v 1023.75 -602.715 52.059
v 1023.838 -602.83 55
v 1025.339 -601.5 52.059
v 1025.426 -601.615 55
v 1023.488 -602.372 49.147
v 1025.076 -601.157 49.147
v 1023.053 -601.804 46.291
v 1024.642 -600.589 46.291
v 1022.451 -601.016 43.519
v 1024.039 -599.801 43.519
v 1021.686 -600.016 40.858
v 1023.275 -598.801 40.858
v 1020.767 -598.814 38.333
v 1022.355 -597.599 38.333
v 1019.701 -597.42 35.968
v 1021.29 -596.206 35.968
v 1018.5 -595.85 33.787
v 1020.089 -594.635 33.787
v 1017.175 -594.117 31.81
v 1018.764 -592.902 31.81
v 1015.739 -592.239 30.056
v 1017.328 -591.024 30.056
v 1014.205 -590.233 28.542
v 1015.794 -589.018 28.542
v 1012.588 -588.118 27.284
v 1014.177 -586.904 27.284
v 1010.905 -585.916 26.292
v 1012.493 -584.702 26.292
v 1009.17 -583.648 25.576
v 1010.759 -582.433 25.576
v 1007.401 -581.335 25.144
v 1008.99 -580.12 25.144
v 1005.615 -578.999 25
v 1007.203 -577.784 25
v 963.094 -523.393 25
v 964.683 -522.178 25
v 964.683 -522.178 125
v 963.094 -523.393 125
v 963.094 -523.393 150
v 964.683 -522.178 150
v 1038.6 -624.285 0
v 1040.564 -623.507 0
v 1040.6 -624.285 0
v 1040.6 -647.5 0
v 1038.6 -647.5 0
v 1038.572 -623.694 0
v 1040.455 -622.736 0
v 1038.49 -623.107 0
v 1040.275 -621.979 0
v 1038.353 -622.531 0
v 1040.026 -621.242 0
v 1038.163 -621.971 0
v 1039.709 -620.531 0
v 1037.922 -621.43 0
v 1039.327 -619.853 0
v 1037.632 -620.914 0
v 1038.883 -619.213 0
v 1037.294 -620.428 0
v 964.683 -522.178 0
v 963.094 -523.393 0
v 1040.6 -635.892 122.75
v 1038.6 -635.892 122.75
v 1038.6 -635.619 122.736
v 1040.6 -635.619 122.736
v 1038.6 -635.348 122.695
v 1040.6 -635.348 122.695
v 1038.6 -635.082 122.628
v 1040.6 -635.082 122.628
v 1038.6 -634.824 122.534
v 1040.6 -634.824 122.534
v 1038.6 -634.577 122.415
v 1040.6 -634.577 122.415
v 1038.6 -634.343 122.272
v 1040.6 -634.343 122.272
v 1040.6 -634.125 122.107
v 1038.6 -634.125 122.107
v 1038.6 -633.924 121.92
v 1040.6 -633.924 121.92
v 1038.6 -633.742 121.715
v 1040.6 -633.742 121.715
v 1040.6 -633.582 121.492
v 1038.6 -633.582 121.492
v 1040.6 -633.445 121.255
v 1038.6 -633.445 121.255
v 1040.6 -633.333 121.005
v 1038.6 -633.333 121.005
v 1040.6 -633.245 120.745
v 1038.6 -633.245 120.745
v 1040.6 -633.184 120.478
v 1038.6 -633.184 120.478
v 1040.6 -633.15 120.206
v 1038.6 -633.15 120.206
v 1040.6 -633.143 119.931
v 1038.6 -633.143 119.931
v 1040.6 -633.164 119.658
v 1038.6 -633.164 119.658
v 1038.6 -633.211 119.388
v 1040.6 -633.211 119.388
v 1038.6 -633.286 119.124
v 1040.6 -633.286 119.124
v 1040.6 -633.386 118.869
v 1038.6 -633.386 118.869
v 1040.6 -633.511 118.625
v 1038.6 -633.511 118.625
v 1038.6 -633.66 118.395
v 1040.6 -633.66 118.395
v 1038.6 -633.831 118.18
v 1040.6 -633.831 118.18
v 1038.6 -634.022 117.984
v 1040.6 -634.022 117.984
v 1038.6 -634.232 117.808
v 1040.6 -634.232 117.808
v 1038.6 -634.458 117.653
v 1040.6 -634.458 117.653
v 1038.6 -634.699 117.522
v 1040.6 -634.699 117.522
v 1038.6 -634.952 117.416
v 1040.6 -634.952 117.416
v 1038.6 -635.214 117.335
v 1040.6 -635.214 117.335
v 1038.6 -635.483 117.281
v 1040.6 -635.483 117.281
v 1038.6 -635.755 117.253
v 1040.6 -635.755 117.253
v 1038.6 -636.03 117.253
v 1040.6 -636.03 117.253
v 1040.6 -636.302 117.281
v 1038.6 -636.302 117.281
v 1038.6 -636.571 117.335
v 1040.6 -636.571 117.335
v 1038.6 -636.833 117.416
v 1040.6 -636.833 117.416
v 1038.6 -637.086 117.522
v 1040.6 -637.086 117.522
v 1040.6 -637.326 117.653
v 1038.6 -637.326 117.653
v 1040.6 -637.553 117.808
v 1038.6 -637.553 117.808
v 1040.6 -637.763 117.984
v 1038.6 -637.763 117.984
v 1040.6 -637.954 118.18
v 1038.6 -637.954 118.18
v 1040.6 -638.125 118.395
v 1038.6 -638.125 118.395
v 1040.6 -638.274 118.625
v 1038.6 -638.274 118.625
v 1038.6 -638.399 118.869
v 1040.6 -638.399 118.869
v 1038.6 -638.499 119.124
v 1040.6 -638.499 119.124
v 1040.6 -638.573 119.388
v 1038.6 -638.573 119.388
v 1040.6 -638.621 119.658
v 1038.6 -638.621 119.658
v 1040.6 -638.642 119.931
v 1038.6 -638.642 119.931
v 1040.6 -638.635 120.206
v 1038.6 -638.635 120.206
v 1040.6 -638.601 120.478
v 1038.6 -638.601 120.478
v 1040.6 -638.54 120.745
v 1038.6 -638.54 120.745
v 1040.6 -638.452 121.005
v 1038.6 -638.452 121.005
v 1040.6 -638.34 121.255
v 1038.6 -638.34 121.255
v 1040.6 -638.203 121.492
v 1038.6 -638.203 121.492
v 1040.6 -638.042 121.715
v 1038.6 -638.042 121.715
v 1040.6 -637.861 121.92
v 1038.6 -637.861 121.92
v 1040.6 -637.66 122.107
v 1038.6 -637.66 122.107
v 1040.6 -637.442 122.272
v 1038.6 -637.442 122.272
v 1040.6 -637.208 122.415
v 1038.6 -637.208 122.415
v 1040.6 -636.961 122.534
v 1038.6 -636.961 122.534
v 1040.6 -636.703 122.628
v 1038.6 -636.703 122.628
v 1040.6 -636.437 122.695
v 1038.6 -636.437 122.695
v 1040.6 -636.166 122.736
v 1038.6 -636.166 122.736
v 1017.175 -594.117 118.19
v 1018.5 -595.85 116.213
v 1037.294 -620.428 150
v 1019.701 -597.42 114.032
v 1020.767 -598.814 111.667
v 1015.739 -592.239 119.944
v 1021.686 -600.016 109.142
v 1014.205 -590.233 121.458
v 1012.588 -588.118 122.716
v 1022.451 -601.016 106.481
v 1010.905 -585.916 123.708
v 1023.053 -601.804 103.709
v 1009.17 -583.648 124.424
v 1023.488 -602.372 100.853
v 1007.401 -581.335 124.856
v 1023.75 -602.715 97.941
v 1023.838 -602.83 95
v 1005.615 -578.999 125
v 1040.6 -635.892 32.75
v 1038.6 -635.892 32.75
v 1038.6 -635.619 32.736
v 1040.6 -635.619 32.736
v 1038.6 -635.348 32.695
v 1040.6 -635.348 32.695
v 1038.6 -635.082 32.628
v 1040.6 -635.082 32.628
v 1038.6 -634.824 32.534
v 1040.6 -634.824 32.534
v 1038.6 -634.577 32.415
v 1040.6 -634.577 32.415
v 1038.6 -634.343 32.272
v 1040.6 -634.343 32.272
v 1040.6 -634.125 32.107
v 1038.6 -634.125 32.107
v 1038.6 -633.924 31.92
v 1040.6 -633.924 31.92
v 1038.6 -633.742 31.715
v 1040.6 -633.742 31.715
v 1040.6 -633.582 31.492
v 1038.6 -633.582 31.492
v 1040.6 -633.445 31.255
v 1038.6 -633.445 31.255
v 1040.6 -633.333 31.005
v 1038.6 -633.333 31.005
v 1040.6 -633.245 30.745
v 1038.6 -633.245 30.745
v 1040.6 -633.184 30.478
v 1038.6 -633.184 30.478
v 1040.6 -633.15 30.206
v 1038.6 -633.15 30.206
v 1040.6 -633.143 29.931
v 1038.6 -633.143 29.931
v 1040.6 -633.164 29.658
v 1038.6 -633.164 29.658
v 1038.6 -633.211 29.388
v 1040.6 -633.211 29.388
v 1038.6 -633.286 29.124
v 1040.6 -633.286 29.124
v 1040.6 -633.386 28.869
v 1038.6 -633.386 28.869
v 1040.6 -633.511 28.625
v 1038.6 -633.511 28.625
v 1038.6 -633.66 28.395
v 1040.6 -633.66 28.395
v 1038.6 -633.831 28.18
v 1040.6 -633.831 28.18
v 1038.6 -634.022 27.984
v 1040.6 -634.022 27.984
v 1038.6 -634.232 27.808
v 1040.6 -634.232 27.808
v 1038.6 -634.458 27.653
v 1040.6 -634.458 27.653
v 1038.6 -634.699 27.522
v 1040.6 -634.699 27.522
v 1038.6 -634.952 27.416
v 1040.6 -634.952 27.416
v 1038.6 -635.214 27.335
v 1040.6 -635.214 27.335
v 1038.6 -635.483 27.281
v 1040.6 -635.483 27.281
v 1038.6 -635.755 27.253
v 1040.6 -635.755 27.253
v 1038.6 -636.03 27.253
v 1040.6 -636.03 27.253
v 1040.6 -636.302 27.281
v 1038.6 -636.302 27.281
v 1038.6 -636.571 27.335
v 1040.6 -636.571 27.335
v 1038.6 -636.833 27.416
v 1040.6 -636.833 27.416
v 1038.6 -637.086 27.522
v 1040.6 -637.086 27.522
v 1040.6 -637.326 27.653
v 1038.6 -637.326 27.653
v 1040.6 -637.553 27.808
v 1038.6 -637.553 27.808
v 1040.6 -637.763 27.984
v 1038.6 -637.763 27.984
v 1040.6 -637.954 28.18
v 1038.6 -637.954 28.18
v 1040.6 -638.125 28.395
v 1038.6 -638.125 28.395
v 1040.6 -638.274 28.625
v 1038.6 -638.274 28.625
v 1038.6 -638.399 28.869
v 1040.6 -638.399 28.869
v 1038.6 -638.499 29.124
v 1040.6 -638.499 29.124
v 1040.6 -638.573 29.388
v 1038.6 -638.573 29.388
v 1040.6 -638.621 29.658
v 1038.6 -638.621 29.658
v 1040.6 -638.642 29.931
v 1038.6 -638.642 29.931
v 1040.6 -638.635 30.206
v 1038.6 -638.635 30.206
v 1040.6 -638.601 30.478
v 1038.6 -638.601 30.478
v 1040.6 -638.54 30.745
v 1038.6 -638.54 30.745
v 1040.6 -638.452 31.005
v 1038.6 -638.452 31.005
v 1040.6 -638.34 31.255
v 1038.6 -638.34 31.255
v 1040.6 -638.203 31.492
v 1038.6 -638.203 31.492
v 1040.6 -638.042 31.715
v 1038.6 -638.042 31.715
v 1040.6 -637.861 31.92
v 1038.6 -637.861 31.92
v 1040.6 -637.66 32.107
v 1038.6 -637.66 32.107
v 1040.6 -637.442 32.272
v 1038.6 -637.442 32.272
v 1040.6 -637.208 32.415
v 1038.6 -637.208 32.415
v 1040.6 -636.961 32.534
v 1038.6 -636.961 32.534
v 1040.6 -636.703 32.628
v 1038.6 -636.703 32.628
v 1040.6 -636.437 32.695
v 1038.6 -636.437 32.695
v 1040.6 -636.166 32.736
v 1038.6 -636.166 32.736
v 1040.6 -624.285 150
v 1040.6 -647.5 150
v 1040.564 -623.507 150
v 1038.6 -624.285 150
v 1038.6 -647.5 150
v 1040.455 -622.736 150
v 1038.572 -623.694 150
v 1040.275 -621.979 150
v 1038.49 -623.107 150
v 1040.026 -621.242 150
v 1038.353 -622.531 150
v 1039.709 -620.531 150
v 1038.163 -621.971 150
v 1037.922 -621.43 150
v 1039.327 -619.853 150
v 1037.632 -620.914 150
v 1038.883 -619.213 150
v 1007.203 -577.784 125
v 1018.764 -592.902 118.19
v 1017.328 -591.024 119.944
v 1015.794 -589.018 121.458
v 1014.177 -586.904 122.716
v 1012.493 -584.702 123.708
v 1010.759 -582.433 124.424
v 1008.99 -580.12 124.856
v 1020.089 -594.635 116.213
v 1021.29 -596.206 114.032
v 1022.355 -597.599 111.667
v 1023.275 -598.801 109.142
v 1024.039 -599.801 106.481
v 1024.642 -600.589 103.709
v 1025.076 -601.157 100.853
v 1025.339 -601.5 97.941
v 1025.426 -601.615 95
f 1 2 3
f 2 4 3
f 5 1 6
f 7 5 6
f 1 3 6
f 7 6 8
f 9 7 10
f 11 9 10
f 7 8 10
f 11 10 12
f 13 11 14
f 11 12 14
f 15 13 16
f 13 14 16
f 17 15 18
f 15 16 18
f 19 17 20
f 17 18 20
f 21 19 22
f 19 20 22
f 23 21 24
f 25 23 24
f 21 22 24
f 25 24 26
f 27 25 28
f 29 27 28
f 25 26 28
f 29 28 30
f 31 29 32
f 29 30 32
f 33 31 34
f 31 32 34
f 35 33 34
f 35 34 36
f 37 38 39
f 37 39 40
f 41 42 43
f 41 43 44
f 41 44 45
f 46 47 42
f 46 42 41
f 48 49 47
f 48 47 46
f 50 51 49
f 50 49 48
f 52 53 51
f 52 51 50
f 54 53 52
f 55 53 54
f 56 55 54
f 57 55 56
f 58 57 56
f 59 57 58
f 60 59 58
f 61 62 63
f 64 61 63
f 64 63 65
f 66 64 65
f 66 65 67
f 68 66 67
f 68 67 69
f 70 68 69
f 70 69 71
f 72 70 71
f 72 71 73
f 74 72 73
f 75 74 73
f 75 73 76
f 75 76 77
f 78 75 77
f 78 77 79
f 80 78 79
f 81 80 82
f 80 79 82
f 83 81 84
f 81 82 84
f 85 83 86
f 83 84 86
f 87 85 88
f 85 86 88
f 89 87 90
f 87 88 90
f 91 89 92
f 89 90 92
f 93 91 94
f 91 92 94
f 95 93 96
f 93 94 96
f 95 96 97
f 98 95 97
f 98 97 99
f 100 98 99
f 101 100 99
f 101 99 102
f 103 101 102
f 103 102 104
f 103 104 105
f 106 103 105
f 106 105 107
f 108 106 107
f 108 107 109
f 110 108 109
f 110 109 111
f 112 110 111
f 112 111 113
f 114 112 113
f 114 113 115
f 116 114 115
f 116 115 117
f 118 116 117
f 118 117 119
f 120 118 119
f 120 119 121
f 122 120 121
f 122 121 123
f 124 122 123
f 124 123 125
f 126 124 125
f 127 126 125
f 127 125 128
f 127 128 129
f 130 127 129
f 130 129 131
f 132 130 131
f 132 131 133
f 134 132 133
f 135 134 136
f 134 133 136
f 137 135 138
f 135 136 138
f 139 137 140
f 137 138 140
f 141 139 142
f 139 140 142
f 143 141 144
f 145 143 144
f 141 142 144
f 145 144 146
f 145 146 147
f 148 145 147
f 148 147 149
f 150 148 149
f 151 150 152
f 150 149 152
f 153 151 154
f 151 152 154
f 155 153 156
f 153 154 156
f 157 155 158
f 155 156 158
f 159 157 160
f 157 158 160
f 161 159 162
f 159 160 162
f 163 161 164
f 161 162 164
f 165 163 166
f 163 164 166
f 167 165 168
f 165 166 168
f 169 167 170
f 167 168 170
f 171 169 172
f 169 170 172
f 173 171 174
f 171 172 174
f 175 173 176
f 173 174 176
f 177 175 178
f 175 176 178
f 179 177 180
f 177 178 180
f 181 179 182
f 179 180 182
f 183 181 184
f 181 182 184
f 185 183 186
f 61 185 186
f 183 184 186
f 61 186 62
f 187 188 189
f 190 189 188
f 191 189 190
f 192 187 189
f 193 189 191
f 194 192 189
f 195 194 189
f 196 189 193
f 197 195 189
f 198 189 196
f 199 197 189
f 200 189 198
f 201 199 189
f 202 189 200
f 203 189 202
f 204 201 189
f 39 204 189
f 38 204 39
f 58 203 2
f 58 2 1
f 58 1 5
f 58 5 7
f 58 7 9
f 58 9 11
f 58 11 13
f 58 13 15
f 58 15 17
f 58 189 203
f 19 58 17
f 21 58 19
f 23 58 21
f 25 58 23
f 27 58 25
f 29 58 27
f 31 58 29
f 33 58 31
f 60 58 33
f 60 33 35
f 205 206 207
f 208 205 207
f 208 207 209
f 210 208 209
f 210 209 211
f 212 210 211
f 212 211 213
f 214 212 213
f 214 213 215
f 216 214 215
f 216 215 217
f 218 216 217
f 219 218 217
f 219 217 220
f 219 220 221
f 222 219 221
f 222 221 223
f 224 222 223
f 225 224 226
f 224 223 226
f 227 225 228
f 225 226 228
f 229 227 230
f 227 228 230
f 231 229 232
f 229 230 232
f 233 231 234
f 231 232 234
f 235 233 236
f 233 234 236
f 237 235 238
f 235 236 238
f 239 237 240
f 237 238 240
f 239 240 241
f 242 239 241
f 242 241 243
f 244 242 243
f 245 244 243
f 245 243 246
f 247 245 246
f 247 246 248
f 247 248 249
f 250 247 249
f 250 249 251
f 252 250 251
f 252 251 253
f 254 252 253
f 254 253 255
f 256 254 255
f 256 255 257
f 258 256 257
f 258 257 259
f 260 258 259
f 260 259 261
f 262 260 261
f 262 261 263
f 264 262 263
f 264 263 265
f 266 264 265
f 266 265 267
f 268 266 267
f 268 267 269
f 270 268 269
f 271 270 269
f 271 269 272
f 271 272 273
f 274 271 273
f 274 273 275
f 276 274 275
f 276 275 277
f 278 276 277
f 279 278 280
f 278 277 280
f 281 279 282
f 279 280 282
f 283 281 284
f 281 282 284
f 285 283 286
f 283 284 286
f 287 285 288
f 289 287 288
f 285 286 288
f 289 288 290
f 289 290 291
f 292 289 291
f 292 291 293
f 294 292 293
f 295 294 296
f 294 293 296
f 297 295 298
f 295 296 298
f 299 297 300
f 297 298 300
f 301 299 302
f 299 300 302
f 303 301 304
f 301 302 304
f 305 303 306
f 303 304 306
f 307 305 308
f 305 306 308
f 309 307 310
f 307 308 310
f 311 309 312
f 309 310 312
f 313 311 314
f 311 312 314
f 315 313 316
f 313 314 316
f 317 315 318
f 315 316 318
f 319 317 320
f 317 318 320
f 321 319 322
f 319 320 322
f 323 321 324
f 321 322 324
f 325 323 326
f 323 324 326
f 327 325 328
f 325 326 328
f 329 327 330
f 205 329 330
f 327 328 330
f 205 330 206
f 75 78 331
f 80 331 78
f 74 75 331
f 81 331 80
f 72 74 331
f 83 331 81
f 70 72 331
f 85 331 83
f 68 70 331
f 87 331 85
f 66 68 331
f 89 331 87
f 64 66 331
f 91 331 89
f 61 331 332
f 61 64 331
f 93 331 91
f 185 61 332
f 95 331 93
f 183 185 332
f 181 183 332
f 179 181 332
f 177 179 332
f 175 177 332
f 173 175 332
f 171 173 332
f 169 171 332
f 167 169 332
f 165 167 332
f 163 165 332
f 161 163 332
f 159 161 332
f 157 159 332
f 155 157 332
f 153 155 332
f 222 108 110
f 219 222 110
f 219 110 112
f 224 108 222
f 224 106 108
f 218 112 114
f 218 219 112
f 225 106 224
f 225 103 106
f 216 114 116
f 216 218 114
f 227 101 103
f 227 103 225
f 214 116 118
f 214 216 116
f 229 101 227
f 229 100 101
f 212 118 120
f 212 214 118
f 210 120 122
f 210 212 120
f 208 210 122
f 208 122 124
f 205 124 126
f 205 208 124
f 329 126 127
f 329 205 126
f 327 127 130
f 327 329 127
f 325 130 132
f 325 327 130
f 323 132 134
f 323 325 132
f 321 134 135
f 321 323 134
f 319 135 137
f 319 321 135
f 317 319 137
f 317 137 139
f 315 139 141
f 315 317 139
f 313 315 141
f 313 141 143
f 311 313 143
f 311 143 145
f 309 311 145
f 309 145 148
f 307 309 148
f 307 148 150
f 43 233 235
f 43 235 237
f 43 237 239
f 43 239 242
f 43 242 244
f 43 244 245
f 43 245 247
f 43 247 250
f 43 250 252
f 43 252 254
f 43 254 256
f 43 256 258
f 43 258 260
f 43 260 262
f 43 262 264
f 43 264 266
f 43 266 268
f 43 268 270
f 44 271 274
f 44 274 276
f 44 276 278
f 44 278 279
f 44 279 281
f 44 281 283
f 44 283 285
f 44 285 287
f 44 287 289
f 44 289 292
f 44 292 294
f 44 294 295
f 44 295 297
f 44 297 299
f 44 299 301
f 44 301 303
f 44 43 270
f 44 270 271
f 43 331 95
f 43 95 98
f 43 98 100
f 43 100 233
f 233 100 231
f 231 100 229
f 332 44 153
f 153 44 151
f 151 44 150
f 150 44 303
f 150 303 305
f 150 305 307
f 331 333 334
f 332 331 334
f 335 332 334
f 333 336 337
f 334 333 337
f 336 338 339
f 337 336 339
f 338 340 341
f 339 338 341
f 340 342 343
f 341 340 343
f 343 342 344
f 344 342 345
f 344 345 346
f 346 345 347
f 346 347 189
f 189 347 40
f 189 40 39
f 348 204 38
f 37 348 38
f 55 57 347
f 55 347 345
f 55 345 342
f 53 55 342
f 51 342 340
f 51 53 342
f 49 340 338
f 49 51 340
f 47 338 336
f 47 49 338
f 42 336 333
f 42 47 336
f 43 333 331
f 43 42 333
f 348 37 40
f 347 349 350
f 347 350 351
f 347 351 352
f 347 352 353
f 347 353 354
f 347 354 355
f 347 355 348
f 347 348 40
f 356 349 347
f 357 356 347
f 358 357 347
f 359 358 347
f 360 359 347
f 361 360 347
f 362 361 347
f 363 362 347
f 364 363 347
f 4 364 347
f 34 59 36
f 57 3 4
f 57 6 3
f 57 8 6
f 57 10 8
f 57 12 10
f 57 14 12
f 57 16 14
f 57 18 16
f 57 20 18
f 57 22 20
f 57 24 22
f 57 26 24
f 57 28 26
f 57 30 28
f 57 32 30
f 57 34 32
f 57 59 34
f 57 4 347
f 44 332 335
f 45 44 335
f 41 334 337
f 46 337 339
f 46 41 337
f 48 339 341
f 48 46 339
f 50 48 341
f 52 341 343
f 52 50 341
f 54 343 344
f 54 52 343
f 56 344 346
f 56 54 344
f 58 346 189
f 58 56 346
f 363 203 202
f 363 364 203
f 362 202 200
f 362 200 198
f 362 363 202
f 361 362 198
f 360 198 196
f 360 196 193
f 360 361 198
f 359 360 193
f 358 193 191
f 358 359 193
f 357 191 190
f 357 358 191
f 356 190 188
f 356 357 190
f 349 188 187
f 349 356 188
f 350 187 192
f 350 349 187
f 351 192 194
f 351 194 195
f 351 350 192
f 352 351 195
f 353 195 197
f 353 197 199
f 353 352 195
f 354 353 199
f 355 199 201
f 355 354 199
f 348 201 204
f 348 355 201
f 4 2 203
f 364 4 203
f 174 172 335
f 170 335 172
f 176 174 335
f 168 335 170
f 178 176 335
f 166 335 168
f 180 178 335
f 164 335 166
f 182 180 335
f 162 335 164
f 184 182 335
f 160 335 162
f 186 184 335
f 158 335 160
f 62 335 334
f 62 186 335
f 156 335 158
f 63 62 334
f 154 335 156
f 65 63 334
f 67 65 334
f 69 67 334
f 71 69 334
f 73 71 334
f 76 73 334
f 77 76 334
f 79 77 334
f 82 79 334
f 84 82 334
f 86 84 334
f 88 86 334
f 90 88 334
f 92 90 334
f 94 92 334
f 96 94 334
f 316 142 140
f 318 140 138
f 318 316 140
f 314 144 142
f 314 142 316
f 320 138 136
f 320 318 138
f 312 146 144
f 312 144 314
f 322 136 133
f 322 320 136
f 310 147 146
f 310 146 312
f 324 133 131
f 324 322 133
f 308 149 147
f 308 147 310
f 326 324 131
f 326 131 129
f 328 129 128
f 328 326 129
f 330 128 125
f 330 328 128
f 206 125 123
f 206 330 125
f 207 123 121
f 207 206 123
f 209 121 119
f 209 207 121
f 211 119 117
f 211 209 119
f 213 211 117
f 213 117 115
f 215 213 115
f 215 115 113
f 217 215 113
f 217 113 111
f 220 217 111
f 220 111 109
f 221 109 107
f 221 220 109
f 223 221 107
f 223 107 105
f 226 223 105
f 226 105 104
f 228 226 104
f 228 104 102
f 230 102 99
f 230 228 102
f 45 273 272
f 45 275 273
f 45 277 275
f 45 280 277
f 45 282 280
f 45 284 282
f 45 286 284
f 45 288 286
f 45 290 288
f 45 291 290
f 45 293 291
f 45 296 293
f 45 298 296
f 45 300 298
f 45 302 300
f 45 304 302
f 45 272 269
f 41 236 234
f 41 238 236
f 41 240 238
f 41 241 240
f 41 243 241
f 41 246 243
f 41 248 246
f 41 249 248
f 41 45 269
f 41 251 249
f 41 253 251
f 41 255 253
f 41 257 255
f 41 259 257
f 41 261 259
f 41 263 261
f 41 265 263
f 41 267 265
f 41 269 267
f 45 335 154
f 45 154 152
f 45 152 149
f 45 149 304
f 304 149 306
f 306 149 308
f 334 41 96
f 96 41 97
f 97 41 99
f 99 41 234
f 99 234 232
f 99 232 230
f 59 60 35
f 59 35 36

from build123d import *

# Parameters (mm, degrees)
ODGI_CIE_BAZOWE1_DEPTH     = 150
SZKIC8_W                   = 100
SZKIC8_H                   = 100
WYTNIJ_WYCI_GNI_CIE3_DEPTH = 10
ZAOKR_GLENIE3_R            = 30
ZAOKR_GLENIE4_R            = 30
OTW_R_POD_RUB_M51_D        = 5.5
OTW_R_POD_RUB_M51_DEPTH    = 14
OTW_R_POD_RUB_M51_TIP      = 1.652366702


# Sheet-metal steps are written as plain solids
with BuildPart() as part:
    # Szkic1 → Odgięcie bazowe1 (new body)
    with BuildSketch(Plane.XY):
        with BuildLine():
            Line((1038.6, -647.5), (1038.6, -624.284884098))
            ThreePointArc((1038.6, -624.284884098), (1038.264712868, -622.248777737), (1037.294258546, -620.427688781))
            Line((1037.294258546, -620.427688781), (963.094449397, -523.392669649))
            Line((963.094449397, -523.392669649), (964.683192246, -522.177804982))
            Line((964.683192246, -522.177804982), (1038.883001396, -619.212824114))
            ThreePointArc((1038.883001396, -619.212824114), (1040.159110622, -621.607484395), (1040.6, -624.284884098))
            Line((1040.6, -624.284884098), (1040.6, -647.5))
            Line((1040.6, -647.5), (1038.6, -647.5))
        make_face()
    extrude(amount=ODGI_CIE_BAZOWE1_DEPTH)

    # Szkic8 → Wytnij-wyciągnięcie3 (cut)
    with BuildSketch(Plane(origin=(355.1865636, 271.600659919, 0), x_dir=(0, 0, 1), z_dir=(-0.7943714246171976, -0.607432333475626, 0))):
        with Locations((75, -1050.782889378)):
            Rectangle(SZKIC8_W, SZKIC8_H)
    extrude(amount=-WYTNIJ_WYCI_GNI_CIE3_DEPTH, mode=Mode.SUBTRACT)

    # Zaokrąglenie3
    zaokr_glenie3_edges = [part.edges().sort_by_distance(p)[0] for p in [
        (1024.632054169, -602.222379777, 125),
    ]]
    fillet(zaokr_glenie3_edges, radius=ZAOKR_GLENIE3_R)

    # Zaokrąglenie4
    zaokr_glenie4_edges = [part.edges().sort_by_distance(p)[0] for p in [
        (1024.632054169, -602.222379777, 25),
    ]]
    fillet(zaokr_glenie4_edges, radius=ZAOKR_GLENIE4_R)

    # Otwór pod śrubę M51
    with Locations(Plane(origin=(1040.6, 0, 0), x_dir=(0, 0, -1), z_dir=(1, 0, 0))):
        with Locations((-30, -635.892442049), (-120, -635.892442049)):
            Hole(OTW_R_POD_RUB_M51_D / 2, depth=OTW_R_POD_RUB_M51_DEPTH)
            with Locations((0, 0, -(OTW_R_POD_RUB_M51_DEPTH + OTW_R_POD_RUB_M51_TIP / 2))):  # 118° drill point
                Cone(0, OTW_R_POD_RUB_M51_D / 2, OTW_R_POD_RUB_M51_TIP, mode=Mode.SUBTRACT)


solid = part.part
